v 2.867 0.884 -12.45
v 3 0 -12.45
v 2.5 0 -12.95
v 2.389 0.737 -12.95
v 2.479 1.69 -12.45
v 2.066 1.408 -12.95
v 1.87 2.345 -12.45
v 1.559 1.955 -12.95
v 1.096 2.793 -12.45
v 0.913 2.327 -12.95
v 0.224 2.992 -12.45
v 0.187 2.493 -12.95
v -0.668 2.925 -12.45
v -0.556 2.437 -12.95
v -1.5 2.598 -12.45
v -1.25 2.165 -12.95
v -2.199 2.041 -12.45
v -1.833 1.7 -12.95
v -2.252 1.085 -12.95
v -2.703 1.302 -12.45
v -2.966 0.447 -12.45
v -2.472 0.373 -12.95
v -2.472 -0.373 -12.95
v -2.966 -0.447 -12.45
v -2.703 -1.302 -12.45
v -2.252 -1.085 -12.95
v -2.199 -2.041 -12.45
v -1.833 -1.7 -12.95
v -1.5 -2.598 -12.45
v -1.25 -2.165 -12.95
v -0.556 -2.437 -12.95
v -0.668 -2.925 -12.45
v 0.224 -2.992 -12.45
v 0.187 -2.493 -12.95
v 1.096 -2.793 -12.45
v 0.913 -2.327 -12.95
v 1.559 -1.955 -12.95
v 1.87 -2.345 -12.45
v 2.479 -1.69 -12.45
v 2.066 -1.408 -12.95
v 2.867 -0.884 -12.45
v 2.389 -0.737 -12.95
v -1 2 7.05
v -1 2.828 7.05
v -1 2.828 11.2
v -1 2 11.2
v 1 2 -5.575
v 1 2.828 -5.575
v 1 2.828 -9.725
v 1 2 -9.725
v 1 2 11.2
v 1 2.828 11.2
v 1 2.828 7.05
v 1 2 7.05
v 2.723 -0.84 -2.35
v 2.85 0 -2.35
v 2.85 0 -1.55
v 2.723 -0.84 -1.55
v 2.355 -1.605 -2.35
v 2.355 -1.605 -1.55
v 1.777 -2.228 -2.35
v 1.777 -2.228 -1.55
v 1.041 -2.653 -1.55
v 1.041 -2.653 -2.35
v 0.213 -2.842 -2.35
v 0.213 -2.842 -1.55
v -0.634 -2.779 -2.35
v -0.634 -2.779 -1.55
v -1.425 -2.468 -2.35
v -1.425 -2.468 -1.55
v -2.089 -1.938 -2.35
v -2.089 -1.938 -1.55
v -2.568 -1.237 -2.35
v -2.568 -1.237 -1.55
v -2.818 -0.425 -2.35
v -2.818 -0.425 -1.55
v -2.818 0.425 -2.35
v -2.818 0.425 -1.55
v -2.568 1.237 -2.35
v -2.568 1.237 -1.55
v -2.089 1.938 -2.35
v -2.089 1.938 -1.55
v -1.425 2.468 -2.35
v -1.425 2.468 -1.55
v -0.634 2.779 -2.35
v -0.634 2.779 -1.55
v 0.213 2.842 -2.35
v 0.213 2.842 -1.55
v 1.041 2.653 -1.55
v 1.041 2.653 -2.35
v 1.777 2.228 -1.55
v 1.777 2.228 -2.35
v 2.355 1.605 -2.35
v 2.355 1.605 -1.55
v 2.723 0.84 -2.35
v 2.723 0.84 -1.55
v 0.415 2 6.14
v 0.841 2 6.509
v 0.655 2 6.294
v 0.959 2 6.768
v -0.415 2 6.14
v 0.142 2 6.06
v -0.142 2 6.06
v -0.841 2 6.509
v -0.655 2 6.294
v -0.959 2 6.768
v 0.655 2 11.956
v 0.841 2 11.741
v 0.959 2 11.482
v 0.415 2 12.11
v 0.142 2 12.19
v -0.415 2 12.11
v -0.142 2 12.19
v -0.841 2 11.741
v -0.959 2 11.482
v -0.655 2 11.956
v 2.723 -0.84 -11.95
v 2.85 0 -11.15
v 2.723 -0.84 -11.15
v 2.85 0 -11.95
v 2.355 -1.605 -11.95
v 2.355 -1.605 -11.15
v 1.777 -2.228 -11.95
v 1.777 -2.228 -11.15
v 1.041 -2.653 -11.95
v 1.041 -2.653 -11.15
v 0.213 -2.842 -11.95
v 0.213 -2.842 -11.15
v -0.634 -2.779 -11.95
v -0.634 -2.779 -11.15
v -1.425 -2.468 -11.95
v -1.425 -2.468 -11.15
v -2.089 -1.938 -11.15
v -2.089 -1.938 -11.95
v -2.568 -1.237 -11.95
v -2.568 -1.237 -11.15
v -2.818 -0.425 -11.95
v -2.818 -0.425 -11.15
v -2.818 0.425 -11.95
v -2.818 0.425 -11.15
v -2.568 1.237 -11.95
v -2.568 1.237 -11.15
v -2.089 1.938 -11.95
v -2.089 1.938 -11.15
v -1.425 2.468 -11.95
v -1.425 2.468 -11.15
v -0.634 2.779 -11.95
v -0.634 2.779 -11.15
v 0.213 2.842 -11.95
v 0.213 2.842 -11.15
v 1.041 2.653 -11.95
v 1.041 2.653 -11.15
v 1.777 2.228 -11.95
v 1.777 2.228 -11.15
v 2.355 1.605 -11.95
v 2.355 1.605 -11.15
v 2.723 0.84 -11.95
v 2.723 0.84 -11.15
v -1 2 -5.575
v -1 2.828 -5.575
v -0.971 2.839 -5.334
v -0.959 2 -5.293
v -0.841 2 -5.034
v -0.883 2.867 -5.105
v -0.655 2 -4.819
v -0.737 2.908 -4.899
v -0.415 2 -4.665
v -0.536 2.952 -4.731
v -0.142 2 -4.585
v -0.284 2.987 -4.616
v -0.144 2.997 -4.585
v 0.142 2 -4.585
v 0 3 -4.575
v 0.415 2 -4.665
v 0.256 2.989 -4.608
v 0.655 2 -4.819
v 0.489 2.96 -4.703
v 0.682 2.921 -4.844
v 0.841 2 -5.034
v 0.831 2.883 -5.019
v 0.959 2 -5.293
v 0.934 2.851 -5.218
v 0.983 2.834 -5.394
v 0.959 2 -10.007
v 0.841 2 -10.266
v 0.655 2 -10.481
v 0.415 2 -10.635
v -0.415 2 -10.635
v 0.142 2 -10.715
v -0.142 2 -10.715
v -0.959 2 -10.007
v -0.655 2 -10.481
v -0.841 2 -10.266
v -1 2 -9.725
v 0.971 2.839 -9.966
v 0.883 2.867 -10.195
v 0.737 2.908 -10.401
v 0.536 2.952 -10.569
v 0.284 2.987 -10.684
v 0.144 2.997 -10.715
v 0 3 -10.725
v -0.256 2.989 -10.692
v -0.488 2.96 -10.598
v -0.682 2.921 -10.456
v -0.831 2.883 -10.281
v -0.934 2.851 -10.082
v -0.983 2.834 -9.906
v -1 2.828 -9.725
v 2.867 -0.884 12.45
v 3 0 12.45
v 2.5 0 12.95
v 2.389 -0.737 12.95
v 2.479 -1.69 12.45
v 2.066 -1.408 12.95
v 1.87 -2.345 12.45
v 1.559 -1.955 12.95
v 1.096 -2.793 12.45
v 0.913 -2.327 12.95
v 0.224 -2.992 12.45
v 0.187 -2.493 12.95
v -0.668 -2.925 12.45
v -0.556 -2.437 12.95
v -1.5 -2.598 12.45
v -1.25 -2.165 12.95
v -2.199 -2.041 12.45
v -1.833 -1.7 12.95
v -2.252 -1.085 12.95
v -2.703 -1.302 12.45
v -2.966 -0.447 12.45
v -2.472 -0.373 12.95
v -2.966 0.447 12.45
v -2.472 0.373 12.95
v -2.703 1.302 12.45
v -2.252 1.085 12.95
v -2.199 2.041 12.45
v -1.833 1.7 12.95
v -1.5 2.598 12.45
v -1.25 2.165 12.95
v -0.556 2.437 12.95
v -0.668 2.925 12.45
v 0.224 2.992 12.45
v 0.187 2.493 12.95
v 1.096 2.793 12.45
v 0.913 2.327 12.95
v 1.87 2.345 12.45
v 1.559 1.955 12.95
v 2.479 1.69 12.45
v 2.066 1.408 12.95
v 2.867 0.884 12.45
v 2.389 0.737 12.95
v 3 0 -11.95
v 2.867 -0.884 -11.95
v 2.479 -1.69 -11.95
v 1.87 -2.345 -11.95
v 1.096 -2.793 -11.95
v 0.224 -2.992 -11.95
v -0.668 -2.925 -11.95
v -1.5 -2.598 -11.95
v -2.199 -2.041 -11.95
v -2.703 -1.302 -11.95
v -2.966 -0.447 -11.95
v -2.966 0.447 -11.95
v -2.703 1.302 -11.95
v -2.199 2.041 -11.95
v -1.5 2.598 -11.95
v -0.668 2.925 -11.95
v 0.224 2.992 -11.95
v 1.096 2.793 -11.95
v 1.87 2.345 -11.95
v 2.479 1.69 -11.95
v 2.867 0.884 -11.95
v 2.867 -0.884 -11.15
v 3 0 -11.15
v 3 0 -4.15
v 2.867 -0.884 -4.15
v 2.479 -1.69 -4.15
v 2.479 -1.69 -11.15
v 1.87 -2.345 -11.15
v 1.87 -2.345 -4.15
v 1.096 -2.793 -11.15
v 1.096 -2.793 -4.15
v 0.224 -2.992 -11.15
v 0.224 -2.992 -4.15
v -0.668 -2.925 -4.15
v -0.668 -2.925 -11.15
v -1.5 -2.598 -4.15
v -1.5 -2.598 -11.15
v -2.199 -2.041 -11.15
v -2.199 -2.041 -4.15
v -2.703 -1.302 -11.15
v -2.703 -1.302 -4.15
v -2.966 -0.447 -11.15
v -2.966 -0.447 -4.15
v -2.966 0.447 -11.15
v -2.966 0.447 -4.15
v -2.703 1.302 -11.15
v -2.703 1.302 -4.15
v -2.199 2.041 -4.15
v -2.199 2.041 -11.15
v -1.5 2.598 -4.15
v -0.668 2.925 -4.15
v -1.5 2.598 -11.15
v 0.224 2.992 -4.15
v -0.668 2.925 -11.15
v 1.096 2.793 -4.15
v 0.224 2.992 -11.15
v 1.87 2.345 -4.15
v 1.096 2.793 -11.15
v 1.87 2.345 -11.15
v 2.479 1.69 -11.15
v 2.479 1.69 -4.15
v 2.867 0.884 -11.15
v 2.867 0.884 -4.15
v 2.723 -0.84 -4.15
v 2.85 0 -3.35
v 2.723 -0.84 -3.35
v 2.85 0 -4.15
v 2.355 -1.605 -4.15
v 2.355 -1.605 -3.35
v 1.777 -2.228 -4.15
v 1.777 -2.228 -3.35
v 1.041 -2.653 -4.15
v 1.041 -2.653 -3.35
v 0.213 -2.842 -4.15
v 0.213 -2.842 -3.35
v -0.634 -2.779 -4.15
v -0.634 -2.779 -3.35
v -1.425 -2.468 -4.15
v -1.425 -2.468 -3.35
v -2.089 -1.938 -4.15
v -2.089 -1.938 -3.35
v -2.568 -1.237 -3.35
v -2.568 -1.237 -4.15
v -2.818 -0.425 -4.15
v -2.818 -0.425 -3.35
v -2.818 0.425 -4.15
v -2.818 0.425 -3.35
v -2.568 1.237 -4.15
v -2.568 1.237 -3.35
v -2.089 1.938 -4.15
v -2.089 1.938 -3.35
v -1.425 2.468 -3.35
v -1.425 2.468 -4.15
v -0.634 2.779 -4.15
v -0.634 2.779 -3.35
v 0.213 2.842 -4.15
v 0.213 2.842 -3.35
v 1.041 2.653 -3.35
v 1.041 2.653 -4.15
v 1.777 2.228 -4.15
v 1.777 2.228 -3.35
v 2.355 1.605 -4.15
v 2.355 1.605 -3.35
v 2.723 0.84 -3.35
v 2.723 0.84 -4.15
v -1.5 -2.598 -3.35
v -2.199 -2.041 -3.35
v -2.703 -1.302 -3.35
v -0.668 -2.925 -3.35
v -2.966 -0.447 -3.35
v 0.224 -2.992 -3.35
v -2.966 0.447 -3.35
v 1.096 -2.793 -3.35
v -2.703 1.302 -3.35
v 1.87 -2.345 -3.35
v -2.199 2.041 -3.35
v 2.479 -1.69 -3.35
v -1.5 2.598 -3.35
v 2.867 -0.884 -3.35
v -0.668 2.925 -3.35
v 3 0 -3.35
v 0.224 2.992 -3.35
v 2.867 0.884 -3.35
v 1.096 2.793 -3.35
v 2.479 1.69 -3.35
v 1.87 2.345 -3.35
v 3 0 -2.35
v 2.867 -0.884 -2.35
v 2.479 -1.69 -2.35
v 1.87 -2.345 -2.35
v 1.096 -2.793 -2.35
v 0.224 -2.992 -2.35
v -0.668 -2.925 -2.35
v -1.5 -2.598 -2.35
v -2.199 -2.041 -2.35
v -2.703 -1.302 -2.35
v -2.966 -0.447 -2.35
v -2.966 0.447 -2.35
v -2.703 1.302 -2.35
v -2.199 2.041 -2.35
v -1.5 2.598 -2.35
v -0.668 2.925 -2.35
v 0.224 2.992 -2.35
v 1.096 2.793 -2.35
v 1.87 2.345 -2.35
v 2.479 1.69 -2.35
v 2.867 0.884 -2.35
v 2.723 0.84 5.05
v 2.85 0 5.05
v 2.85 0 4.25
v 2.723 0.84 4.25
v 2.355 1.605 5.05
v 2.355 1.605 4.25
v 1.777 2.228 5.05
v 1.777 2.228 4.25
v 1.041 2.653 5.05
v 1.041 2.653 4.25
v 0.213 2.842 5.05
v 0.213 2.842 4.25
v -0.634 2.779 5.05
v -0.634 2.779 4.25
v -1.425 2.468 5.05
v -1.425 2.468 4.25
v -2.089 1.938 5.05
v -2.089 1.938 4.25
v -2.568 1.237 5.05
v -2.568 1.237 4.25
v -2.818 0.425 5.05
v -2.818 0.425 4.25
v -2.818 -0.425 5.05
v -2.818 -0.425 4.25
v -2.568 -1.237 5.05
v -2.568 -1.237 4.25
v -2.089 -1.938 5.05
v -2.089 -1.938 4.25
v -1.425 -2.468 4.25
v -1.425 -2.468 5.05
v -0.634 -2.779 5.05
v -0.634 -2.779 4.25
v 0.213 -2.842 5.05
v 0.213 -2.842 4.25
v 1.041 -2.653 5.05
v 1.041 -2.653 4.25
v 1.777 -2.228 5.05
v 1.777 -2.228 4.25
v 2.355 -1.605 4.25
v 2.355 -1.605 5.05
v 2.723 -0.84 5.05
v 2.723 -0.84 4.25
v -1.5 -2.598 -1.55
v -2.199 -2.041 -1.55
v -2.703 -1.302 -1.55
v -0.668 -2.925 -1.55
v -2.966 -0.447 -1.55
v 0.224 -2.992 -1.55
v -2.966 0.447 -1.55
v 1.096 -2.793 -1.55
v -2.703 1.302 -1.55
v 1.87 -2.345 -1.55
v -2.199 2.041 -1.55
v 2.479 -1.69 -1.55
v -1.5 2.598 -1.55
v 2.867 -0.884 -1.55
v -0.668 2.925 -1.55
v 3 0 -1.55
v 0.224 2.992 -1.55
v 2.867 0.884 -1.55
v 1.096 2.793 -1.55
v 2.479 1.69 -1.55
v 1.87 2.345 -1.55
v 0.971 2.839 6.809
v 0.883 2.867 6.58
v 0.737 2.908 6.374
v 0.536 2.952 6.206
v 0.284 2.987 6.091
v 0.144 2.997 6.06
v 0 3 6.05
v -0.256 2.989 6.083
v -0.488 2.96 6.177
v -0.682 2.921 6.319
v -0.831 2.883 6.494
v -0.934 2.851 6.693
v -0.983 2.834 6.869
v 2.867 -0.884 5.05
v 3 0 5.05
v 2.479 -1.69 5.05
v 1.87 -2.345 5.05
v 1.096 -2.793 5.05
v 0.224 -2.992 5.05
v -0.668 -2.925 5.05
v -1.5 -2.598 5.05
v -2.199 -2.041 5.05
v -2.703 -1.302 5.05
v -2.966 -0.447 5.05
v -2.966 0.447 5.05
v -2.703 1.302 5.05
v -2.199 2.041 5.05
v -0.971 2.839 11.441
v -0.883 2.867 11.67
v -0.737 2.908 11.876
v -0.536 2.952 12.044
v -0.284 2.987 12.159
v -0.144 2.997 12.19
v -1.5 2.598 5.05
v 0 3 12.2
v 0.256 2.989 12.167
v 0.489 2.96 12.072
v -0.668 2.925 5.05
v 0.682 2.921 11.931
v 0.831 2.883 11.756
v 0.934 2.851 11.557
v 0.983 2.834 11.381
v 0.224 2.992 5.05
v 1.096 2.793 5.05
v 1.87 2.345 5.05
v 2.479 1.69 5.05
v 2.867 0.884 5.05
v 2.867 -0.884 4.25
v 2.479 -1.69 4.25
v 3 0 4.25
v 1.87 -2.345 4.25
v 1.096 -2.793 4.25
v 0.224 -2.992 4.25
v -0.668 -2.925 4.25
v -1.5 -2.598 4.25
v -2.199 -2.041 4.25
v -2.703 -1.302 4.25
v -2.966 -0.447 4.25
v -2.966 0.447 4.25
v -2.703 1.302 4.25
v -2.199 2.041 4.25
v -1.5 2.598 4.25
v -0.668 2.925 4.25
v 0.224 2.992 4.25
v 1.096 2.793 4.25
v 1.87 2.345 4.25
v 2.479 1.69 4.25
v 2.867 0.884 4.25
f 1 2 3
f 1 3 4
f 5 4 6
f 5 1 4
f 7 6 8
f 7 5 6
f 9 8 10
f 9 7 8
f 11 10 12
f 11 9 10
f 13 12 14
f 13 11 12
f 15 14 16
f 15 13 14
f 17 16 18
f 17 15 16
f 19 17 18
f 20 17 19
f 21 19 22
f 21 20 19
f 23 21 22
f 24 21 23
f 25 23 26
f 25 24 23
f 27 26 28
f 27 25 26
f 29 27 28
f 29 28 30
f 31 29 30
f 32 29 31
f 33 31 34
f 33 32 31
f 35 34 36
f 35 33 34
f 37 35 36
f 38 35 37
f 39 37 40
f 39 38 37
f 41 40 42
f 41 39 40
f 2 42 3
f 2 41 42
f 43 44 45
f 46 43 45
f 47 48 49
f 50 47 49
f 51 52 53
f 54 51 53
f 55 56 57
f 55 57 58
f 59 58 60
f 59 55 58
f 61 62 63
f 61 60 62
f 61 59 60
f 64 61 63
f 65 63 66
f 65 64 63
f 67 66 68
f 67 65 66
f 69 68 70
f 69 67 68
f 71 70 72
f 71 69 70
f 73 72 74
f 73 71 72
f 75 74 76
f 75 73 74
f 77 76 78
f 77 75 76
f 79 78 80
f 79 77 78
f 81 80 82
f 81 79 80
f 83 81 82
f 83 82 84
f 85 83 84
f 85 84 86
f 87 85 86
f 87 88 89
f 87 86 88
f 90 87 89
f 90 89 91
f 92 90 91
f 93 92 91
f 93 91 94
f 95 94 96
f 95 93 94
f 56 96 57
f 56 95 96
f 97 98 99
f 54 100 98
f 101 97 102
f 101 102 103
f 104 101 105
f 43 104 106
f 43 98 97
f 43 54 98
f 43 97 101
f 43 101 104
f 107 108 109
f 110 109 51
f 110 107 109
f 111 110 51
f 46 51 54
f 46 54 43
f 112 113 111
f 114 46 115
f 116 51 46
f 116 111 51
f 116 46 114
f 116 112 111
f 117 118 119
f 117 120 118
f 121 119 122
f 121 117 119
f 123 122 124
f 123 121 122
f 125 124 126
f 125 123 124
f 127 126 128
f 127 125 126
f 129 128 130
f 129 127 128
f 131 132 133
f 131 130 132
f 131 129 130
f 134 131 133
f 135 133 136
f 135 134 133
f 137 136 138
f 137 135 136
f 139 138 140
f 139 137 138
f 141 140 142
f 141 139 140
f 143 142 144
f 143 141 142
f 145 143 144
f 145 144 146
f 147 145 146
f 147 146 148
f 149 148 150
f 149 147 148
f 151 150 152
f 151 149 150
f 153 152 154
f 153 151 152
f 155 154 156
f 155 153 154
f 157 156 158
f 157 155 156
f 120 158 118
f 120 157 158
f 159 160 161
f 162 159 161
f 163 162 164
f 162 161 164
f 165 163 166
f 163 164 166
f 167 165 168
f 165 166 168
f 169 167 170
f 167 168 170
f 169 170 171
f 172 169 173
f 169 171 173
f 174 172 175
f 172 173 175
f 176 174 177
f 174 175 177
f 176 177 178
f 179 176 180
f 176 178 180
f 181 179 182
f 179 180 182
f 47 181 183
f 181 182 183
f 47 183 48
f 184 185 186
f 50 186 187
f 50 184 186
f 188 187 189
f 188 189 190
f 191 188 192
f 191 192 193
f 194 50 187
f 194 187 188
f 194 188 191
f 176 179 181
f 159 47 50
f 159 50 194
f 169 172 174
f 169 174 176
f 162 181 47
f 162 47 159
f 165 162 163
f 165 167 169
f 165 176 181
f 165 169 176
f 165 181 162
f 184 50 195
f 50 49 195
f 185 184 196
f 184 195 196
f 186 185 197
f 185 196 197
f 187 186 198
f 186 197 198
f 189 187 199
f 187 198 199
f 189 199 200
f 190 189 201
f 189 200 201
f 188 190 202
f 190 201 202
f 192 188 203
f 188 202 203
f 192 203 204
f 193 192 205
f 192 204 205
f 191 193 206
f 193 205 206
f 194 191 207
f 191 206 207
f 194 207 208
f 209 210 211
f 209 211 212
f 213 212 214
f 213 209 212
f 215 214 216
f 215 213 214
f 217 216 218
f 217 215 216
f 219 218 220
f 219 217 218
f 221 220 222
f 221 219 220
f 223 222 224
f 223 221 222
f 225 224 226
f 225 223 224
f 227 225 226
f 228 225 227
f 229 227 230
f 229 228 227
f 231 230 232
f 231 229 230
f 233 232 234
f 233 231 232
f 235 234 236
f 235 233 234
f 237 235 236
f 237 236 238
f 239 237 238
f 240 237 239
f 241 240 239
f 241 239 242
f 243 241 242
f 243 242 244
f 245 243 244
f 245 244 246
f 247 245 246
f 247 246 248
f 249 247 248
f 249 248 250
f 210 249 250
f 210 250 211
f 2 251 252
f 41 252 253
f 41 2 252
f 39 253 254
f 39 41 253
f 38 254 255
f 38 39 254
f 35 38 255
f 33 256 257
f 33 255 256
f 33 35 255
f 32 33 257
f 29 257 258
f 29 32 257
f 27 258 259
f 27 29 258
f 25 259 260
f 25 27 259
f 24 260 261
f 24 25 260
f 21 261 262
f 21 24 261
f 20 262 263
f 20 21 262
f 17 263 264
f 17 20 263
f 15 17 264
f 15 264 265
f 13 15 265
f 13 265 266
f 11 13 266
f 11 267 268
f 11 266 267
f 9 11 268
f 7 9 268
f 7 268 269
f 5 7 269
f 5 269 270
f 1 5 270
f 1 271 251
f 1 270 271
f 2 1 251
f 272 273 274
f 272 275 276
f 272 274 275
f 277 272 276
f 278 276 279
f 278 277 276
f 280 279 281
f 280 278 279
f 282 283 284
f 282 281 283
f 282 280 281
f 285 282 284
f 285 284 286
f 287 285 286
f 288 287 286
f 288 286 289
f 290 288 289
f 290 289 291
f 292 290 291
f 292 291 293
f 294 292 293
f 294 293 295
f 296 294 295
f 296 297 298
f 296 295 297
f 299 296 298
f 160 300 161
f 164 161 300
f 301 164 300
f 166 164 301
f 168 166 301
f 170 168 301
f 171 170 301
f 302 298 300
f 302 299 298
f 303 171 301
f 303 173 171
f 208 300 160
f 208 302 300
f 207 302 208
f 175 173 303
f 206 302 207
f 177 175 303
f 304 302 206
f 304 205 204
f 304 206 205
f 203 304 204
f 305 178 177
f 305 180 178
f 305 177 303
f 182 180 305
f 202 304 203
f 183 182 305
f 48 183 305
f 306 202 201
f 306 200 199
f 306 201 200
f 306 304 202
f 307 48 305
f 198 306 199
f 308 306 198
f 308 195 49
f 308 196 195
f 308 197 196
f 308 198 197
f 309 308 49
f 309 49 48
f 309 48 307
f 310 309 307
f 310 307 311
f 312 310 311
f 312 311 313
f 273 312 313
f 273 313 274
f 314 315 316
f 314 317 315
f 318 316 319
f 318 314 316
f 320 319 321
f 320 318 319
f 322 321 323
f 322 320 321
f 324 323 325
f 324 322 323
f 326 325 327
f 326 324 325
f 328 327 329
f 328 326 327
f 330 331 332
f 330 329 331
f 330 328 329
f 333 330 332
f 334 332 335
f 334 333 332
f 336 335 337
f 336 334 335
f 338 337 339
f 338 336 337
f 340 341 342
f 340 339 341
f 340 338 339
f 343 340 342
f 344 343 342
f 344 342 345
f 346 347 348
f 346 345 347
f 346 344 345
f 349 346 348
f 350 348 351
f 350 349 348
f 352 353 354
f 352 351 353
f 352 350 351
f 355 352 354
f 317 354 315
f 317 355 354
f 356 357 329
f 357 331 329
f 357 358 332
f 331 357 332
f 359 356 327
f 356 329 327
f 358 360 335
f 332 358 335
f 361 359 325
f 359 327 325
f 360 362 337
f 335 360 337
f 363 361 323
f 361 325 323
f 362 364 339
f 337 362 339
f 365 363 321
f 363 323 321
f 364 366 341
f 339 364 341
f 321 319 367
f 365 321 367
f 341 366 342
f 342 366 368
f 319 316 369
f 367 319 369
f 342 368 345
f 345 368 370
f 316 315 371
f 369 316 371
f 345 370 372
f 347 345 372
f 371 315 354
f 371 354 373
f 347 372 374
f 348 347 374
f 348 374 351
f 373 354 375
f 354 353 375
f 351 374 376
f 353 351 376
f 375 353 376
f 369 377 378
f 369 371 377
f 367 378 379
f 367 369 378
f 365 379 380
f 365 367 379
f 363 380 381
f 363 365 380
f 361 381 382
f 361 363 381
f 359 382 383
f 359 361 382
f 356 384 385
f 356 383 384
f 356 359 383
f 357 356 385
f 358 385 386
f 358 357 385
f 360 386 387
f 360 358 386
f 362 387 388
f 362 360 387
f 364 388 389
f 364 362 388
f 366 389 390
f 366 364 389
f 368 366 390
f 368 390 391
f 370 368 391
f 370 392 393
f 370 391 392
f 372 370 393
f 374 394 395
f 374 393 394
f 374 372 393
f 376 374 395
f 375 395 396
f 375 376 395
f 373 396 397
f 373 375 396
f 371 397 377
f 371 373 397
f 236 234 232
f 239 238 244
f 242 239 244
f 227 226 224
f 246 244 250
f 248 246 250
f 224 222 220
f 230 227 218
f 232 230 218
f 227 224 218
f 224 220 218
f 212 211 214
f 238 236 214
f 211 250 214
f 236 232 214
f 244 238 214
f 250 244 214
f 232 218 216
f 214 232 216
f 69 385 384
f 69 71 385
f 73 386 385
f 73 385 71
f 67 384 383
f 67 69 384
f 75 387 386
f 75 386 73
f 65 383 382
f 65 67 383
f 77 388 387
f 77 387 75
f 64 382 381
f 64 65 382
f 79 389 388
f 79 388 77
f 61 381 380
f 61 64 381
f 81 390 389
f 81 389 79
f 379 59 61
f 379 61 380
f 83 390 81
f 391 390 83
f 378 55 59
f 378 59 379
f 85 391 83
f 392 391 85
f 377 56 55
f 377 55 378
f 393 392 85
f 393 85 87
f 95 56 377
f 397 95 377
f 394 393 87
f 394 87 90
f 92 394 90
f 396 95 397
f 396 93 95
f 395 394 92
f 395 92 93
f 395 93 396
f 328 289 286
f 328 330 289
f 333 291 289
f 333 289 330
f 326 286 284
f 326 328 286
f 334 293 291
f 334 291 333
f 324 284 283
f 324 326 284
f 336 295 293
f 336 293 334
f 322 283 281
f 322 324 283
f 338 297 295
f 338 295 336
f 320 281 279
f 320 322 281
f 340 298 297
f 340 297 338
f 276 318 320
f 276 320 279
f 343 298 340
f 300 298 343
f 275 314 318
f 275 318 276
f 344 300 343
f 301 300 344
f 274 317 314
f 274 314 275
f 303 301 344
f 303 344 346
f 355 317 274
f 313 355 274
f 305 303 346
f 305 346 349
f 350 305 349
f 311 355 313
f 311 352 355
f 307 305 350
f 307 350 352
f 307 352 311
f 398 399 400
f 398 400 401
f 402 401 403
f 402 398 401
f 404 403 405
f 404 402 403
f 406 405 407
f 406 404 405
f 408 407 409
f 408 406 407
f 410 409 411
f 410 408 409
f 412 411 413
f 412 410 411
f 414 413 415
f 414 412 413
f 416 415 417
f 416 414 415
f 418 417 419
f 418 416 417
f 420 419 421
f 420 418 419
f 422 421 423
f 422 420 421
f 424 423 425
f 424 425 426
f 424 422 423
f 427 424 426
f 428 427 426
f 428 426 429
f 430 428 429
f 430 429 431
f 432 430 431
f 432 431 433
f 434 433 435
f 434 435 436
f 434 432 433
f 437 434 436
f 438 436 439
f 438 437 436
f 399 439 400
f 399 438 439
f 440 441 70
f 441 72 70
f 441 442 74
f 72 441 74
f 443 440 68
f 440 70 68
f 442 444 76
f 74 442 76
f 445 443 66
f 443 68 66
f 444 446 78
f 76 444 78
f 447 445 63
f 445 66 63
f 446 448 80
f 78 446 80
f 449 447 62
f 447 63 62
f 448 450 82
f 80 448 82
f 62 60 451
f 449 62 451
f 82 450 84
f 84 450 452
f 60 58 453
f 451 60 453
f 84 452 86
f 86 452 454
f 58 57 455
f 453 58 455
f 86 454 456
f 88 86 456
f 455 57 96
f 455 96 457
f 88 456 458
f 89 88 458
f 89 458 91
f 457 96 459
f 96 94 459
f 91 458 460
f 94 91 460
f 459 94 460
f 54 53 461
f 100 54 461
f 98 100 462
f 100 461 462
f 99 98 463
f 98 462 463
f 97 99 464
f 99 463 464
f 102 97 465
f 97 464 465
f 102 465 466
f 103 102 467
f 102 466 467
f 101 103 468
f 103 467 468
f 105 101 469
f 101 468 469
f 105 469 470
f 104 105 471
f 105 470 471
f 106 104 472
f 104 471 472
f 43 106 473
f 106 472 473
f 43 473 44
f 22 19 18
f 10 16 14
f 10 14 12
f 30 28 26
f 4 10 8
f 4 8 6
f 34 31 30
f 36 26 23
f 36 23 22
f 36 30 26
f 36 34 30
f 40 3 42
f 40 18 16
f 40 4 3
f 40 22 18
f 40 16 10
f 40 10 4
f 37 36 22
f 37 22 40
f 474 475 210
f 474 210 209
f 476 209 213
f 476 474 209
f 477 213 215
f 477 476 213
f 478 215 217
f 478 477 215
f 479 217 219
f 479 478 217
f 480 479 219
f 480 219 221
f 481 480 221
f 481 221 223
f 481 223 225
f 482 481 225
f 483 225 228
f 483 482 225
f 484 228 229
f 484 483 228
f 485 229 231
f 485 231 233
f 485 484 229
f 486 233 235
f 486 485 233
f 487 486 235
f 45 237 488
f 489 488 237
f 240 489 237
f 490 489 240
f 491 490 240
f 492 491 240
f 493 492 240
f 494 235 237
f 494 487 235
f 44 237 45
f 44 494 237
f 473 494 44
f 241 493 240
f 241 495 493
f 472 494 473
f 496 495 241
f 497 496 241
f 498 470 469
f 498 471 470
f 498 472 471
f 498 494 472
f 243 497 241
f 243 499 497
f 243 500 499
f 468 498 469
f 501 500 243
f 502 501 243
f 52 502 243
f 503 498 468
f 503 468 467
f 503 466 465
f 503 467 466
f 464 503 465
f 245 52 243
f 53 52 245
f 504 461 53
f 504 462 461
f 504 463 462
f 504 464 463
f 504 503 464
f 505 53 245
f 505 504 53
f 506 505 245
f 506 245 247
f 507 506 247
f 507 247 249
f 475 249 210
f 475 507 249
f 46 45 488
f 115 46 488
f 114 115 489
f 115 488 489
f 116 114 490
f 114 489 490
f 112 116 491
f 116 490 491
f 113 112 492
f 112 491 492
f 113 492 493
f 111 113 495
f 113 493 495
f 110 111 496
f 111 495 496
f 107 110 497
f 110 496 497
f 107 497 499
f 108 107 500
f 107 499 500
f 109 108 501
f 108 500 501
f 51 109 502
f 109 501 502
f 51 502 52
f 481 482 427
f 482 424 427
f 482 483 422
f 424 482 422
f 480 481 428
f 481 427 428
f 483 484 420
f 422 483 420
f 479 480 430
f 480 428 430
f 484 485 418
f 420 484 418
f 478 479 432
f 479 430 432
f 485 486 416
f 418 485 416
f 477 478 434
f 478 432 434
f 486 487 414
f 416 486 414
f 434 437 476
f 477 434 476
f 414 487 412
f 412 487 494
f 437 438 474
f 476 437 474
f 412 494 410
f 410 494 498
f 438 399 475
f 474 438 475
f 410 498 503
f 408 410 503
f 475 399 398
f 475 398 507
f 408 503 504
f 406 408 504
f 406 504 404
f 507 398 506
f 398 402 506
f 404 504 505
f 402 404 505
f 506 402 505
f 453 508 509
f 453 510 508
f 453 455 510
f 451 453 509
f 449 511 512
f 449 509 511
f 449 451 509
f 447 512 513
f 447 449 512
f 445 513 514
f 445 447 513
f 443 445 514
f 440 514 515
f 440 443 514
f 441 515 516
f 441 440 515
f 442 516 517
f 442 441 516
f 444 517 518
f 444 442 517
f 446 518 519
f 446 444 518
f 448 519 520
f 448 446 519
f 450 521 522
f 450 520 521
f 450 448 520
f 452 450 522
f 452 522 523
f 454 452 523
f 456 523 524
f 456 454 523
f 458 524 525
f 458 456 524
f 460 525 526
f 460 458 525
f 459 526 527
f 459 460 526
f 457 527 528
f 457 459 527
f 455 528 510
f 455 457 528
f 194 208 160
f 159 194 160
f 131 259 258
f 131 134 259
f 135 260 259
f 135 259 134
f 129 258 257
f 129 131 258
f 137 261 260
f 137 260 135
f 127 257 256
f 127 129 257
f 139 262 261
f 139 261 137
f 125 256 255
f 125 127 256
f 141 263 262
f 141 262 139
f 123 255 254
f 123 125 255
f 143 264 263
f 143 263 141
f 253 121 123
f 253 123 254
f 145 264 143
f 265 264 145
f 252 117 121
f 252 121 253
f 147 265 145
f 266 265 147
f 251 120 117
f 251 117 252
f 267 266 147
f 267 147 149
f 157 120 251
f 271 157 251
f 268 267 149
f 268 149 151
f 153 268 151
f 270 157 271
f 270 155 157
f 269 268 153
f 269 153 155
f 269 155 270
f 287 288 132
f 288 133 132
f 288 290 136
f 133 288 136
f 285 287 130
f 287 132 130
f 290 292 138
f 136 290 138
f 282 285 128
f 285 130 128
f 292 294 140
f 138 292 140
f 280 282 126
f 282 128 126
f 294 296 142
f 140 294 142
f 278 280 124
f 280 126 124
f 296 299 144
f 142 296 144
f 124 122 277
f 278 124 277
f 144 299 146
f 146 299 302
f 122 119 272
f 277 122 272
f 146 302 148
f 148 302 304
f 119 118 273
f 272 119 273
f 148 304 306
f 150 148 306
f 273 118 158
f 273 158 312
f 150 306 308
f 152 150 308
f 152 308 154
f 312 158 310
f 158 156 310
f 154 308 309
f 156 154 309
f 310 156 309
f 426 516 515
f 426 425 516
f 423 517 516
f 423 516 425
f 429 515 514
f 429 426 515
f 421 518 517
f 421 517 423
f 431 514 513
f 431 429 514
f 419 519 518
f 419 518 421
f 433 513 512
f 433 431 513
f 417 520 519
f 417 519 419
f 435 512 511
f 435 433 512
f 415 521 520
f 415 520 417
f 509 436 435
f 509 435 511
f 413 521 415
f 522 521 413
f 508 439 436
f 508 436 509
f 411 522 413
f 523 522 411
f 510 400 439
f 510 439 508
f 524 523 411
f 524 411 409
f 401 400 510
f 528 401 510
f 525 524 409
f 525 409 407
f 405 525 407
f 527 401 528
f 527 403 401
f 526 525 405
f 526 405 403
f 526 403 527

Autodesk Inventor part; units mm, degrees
ref_plane "YZ Plane" through (0, 0, 0) normal (1, 0, 0) x (0, 1, 0)
ref_plane "XY Plane" through (0, 0, 0) normal (0, 0, 1) x (1, 0, 0)
sketch "Sketch1" plane through (0, 0, 0) normal (0, 1, 0) x (-1, 0, 0)
  line L0 (0, -18.13) -> (0, 18.13) construction
  line L1 (-3.6, 0) -> (0.6, 0) construction
  line L2 (0, 12.95) -> (-3, 12.95)
  line L3 (-3, 12.95) -> (-3, -12.95)
  line L4 (-3, -12.95) -> (0, -12.95)
  line L5 (0, 12.95) -> (0, -12.95)
  point P0 (0, 0)
  dimension "d0" = 3
  dimension "d1" = 25.9
revolve "Revolution1" add sketch "Sketch1" angle 360 about axis through (0, 0, 12.95) along (0, 0, -1)
sketch "Sketch2" plane through (0, 0, 0) normal (0, 1, 0) x (-1, 0, 0)
  line L0 (0, -18.2) -> (0, 18.2) construction
  line L1 (-4.2, 0) -> (4.2, 0) construction
  line L2 (-3, 12.95) -> (-3, 12.95)
  line L3 (-3, 4.25) -> (-2.85, 4.25)
  line L4 (-2.85, 4.25) -> (-2.85, 5.05)
  line L5 (-2.85, 5.05) -> (-3, 5.05)
  line L6 (-3, 5.05) -> (-3, 4.25)
  line L7 (-3, 4.25) -> (-3, 5.05)
  line L8 (-3, -12.95) -> (-3, 12.95) projected
  line L9 (3, 12.95) -> (-3, 12.95) projected
  line L10 (-3, -1.55) -> (-2.85, -1.55)
  line L11 (-2.85, -1.55) -> (-2.85, -2.35)
  line L12 (-2.85, -2.35) -> (-3, -2.35)
  line L13 (-3, -2.35) -> (-3, -1.55)
  line L14 (-3, -3.35) -> (-2.85, -3.35)
  line L15 (-2.85, -3.35) -> (-2.85, -4.15)
  line L16 (-2.85, -4.15) -> (-3, -4.15)
  line L17 (-3, -4.15) -> (-3, -3.35)
  line L18 (-3, -11.15) -> (-2.85, -11.15)
  line L19 (-2.85, -11.15) -> (-2.85, -11.95)
  line L20 (-2.85, -11.95) -> (-3, -11.95)
  line L21 (-3, -11.95) -> (-3, -11.15)
  line L22 (3, -12.95) -> (-3, -12.95) projected
  point P0 (-3, -2.35)
  point P1 (-3, -4.15)
  point P2 (-3, -11.95)
  dimension "d34" = 0.8
  dimension "d35" = 2.85
  dimension "d57" = 5.8
  dimension "d58" = 7
  dimension "d59" = 1
  dimension "d63" = 1
revolve "Revolution2" cut sketch "Sketch2" angle 360 about axis through (0, 0, 0) along (0, 0, 1)
ref_plane "Work Plane2" through (0, 3, 0) normal (0, 1, 0) x (-1, 0, 0)
sketch "Sketch4" plane through (0, 3, 0) normal (0, 1, 0) x (-1, 0, 0)
  line L0 (0, -26.0074) -> (0, 32.7926) construction
  line L1 (1, -9.725) -> (1, -5.575)
  line L2 (-1, -5.575) -> (-1, -9.725)
  arc A0 (-1, -9.725) -> (1, -9.725) centre (0, -9.725) ccw
  arc A1 (1, -5.575) -> (-1, -5.575) centre (0, -5.575) ccw
  line L3 (3, -12.95) -> (-3, -12.95) projected
  line L4 (-1, -7.65) -> (1, -7.65) construction
  line L5 (-3, -4.15) -> (3, -4.15) construction
  line L6 (3, -11.15) -> (-3, -11.15) construction
  line L7 (0, -17.6074) -> (0, 24.3926) construction
  line L8 (1, 7.05) -> (1, 11.2)
  line L9 (-1, 11.2) -> (-1, 7.05)
  arc A2 (-1, 7.05) -> (1, 7.05) centre (0, 7.05) ccw
  arc A3 (1, 11.2) -> (-1, 11.2) centre (0, 11.2) ccw
  line L10 (3, 12.95) -> (-3, 12.95) projected
  point P0 (0, 0)
  point P1 (1, 1)
  point P2 (0, 24.3926)
  dimension "d49" = 6.15
  dimension "d50" = 1
  dimension "d60" = 3.5
  dimension "d61" = 3.5
  dimension "d64" = 6.15
  dimension "d65" = 1
  dimension "d66" = 1.75
extrude "Extrusion2" cut sketch "Sketch4" against normal blind 1
chamfer "Chamfer3" distance 0.5 angle 45 2 edges at (-3, 0, -12.95) (-3, 0, 12.95)
equation "\"module\" = 1"
equation "\"pressure_ang\" = 30deg"
equation "\"pitch\" = 3.1416 * module"
equation "\"addendum\" = 0.45 * module"
equation "\"dedendum\" = 0.65 * module"
equation "\"tooth_depth\" = addendum + dedendum"
equation "\"addendum_mod_shaft\" = 0.45 * module"
equation "\"root_fillet_r\" = 0.16 * module"
equation "\"addendum_mod_hub\" = -addendum_mod_shaft"
equation "\"nom_space_t_hub\" = nom_tooth_t_shaft"
equation "\"nom_tooth_t_shaft\" = 2.090415"
properties part number "Shaft_stage_input" material "Steel"
